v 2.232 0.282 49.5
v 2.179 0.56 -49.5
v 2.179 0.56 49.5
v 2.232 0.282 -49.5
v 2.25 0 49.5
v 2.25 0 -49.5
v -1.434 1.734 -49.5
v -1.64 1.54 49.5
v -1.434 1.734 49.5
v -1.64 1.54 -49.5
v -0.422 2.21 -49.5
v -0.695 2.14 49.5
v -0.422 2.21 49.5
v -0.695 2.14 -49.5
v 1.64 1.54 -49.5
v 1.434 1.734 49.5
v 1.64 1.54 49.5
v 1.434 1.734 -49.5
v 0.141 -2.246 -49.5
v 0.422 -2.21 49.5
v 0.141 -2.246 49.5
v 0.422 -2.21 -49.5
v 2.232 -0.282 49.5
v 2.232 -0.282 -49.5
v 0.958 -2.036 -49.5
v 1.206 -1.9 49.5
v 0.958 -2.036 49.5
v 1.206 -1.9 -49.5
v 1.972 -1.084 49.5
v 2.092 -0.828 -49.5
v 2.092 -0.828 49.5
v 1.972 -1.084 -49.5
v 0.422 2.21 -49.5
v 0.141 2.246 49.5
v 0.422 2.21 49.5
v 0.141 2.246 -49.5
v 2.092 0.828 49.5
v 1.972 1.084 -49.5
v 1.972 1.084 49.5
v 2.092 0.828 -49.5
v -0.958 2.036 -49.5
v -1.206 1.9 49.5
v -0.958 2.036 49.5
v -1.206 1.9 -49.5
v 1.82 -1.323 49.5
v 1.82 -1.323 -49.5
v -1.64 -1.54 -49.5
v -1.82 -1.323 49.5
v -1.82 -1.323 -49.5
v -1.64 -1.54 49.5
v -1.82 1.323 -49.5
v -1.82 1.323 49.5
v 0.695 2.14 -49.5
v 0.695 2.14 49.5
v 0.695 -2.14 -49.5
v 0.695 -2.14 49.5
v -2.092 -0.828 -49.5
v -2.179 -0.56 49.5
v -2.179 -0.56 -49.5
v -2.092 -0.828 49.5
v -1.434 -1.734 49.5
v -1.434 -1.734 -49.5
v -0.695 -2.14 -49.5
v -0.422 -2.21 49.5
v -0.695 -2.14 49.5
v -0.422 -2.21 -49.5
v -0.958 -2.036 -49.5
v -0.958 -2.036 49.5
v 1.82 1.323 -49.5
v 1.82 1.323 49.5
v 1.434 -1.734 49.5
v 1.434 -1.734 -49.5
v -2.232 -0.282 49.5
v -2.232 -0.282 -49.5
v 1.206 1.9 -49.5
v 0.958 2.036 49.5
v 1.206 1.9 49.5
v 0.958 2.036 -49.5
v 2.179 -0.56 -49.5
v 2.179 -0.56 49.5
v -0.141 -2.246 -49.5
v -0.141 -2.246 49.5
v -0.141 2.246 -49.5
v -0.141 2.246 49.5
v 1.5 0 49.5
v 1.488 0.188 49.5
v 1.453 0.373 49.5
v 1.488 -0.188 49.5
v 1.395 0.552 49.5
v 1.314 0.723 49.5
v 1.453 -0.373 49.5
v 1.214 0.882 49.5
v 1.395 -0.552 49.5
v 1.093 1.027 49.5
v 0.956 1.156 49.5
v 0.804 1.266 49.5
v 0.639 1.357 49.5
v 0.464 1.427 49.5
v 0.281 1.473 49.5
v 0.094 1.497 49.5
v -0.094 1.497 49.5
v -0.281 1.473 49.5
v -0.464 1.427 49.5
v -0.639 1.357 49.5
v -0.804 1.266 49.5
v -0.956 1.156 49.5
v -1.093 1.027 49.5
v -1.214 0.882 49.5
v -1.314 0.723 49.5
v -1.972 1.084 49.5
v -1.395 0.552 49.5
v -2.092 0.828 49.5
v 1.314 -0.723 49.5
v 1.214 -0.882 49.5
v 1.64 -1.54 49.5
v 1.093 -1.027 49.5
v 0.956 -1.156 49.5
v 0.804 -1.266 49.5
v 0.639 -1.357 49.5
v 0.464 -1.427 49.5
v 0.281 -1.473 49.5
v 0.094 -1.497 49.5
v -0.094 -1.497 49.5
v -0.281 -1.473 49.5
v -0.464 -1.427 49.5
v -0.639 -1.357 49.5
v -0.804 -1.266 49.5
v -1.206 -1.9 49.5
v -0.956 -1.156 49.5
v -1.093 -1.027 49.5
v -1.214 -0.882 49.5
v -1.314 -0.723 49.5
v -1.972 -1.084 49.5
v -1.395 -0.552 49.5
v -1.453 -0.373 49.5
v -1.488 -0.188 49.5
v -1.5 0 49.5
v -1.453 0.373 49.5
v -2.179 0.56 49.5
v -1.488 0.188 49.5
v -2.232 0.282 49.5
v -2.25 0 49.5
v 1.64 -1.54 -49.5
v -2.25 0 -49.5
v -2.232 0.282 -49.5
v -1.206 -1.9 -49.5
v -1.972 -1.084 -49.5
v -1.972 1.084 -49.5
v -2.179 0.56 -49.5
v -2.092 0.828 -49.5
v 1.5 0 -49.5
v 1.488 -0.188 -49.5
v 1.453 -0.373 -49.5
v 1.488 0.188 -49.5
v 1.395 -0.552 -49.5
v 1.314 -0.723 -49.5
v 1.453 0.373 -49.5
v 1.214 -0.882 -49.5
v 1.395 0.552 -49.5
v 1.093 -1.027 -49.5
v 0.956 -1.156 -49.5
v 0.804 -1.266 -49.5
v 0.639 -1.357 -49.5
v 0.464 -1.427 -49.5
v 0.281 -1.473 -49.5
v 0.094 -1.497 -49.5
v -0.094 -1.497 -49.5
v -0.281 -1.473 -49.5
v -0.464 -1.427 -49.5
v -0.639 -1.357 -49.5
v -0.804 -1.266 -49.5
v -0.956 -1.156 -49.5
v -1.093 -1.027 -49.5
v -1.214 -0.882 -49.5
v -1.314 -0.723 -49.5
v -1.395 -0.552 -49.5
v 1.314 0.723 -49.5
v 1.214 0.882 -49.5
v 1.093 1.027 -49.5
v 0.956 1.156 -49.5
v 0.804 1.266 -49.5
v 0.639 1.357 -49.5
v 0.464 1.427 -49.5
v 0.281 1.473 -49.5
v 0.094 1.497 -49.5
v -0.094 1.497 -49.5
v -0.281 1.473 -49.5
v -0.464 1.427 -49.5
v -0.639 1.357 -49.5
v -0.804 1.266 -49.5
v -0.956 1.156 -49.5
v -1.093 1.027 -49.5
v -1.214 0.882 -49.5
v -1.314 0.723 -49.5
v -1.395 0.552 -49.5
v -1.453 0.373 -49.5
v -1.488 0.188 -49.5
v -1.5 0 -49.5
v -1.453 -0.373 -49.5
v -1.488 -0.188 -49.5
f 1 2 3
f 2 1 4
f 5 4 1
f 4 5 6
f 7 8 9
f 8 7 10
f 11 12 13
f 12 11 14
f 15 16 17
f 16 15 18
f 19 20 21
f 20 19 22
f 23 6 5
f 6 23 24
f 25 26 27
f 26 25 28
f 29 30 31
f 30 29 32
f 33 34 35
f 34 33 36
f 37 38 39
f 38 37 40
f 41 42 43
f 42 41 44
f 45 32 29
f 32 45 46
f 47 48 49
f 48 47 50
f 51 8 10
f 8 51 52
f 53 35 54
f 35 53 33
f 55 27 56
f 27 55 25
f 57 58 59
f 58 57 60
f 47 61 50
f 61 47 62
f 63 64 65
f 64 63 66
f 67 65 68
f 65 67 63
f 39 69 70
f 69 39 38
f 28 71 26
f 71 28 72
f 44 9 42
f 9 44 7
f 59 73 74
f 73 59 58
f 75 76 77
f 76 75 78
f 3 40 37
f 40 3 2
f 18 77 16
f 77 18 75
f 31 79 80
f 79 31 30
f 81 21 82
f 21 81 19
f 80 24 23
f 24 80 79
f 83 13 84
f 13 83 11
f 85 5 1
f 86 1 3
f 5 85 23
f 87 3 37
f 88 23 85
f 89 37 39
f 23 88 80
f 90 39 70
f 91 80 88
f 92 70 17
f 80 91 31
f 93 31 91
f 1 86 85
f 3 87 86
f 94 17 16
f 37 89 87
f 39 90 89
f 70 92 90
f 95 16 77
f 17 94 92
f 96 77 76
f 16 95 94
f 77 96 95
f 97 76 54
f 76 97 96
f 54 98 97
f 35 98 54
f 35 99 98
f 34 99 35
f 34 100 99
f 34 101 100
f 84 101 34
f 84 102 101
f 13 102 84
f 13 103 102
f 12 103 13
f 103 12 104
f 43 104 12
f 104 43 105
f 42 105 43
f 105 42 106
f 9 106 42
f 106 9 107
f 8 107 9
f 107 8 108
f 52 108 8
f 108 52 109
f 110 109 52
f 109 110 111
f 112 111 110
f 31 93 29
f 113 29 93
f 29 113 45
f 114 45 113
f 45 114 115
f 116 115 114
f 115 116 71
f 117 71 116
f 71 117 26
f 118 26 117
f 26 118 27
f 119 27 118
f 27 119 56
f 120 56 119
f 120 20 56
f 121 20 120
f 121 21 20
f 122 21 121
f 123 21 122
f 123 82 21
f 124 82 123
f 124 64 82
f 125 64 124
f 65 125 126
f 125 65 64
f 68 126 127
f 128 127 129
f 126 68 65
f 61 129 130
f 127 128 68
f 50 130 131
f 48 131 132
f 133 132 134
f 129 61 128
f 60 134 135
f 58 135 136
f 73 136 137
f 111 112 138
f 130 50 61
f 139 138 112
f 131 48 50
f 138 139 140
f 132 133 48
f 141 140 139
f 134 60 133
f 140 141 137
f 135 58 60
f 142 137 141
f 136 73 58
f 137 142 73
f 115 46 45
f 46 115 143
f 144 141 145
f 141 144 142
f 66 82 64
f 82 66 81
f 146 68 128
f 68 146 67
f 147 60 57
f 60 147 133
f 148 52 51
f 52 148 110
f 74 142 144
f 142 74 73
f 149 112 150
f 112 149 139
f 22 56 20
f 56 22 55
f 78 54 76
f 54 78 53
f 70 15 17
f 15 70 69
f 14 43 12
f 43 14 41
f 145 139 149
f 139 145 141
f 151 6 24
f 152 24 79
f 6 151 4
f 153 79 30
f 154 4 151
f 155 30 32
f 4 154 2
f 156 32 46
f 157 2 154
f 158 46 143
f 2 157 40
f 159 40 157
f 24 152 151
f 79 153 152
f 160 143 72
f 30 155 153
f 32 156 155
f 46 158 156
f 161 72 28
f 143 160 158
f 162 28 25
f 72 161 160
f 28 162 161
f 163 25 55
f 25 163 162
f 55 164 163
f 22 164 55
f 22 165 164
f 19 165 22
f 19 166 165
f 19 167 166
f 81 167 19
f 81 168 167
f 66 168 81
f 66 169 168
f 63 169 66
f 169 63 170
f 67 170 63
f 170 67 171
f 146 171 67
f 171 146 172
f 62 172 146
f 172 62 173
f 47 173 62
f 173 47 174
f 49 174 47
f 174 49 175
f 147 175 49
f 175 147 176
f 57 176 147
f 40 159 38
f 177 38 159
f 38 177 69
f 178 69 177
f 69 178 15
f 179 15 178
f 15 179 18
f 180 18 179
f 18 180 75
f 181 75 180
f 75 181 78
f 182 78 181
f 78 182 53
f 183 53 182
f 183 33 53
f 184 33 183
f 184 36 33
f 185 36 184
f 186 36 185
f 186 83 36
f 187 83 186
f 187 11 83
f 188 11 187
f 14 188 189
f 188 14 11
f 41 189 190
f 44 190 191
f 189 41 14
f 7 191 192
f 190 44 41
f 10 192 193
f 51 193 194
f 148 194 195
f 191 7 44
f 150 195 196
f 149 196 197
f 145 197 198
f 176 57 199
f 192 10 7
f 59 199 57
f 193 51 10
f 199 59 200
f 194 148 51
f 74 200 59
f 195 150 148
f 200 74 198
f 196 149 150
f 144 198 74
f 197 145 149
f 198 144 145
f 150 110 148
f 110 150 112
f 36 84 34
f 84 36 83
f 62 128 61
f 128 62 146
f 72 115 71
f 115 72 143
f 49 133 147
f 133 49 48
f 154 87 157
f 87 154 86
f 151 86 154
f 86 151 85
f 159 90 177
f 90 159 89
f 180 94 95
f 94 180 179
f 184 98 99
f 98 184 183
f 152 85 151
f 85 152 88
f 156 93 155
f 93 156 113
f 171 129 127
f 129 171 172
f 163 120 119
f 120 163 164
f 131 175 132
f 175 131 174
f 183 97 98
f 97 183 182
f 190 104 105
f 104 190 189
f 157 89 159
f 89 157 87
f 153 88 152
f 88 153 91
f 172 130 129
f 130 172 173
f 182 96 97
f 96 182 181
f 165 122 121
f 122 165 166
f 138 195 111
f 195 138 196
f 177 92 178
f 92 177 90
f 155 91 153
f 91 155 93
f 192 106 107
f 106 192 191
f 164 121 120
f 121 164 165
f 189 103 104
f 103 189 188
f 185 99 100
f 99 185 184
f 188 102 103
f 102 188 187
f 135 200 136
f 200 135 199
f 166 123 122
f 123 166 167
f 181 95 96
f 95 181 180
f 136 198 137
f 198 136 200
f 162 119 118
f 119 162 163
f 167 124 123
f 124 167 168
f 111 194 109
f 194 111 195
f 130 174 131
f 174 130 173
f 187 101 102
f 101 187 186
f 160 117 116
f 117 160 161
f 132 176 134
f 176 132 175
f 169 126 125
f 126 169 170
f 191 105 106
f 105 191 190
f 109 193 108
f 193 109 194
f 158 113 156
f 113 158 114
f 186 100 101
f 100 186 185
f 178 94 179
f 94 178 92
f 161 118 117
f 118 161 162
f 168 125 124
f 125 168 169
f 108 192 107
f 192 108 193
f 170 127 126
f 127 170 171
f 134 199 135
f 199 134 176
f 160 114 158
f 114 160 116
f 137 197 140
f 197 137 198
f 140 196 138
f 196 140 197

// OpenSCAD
$fn = 50;


difference() {
	union() {
		translate(v = [0, 0, -49.5000000000]) {
			cylinder(h = 99, r = 2.2500000000);
		}
	}
	union() {
		translate(v = [0, 0, -100.0000000000]) {
			cylinder(h = 200, r = 1.5000000000);
		}
	}
}
